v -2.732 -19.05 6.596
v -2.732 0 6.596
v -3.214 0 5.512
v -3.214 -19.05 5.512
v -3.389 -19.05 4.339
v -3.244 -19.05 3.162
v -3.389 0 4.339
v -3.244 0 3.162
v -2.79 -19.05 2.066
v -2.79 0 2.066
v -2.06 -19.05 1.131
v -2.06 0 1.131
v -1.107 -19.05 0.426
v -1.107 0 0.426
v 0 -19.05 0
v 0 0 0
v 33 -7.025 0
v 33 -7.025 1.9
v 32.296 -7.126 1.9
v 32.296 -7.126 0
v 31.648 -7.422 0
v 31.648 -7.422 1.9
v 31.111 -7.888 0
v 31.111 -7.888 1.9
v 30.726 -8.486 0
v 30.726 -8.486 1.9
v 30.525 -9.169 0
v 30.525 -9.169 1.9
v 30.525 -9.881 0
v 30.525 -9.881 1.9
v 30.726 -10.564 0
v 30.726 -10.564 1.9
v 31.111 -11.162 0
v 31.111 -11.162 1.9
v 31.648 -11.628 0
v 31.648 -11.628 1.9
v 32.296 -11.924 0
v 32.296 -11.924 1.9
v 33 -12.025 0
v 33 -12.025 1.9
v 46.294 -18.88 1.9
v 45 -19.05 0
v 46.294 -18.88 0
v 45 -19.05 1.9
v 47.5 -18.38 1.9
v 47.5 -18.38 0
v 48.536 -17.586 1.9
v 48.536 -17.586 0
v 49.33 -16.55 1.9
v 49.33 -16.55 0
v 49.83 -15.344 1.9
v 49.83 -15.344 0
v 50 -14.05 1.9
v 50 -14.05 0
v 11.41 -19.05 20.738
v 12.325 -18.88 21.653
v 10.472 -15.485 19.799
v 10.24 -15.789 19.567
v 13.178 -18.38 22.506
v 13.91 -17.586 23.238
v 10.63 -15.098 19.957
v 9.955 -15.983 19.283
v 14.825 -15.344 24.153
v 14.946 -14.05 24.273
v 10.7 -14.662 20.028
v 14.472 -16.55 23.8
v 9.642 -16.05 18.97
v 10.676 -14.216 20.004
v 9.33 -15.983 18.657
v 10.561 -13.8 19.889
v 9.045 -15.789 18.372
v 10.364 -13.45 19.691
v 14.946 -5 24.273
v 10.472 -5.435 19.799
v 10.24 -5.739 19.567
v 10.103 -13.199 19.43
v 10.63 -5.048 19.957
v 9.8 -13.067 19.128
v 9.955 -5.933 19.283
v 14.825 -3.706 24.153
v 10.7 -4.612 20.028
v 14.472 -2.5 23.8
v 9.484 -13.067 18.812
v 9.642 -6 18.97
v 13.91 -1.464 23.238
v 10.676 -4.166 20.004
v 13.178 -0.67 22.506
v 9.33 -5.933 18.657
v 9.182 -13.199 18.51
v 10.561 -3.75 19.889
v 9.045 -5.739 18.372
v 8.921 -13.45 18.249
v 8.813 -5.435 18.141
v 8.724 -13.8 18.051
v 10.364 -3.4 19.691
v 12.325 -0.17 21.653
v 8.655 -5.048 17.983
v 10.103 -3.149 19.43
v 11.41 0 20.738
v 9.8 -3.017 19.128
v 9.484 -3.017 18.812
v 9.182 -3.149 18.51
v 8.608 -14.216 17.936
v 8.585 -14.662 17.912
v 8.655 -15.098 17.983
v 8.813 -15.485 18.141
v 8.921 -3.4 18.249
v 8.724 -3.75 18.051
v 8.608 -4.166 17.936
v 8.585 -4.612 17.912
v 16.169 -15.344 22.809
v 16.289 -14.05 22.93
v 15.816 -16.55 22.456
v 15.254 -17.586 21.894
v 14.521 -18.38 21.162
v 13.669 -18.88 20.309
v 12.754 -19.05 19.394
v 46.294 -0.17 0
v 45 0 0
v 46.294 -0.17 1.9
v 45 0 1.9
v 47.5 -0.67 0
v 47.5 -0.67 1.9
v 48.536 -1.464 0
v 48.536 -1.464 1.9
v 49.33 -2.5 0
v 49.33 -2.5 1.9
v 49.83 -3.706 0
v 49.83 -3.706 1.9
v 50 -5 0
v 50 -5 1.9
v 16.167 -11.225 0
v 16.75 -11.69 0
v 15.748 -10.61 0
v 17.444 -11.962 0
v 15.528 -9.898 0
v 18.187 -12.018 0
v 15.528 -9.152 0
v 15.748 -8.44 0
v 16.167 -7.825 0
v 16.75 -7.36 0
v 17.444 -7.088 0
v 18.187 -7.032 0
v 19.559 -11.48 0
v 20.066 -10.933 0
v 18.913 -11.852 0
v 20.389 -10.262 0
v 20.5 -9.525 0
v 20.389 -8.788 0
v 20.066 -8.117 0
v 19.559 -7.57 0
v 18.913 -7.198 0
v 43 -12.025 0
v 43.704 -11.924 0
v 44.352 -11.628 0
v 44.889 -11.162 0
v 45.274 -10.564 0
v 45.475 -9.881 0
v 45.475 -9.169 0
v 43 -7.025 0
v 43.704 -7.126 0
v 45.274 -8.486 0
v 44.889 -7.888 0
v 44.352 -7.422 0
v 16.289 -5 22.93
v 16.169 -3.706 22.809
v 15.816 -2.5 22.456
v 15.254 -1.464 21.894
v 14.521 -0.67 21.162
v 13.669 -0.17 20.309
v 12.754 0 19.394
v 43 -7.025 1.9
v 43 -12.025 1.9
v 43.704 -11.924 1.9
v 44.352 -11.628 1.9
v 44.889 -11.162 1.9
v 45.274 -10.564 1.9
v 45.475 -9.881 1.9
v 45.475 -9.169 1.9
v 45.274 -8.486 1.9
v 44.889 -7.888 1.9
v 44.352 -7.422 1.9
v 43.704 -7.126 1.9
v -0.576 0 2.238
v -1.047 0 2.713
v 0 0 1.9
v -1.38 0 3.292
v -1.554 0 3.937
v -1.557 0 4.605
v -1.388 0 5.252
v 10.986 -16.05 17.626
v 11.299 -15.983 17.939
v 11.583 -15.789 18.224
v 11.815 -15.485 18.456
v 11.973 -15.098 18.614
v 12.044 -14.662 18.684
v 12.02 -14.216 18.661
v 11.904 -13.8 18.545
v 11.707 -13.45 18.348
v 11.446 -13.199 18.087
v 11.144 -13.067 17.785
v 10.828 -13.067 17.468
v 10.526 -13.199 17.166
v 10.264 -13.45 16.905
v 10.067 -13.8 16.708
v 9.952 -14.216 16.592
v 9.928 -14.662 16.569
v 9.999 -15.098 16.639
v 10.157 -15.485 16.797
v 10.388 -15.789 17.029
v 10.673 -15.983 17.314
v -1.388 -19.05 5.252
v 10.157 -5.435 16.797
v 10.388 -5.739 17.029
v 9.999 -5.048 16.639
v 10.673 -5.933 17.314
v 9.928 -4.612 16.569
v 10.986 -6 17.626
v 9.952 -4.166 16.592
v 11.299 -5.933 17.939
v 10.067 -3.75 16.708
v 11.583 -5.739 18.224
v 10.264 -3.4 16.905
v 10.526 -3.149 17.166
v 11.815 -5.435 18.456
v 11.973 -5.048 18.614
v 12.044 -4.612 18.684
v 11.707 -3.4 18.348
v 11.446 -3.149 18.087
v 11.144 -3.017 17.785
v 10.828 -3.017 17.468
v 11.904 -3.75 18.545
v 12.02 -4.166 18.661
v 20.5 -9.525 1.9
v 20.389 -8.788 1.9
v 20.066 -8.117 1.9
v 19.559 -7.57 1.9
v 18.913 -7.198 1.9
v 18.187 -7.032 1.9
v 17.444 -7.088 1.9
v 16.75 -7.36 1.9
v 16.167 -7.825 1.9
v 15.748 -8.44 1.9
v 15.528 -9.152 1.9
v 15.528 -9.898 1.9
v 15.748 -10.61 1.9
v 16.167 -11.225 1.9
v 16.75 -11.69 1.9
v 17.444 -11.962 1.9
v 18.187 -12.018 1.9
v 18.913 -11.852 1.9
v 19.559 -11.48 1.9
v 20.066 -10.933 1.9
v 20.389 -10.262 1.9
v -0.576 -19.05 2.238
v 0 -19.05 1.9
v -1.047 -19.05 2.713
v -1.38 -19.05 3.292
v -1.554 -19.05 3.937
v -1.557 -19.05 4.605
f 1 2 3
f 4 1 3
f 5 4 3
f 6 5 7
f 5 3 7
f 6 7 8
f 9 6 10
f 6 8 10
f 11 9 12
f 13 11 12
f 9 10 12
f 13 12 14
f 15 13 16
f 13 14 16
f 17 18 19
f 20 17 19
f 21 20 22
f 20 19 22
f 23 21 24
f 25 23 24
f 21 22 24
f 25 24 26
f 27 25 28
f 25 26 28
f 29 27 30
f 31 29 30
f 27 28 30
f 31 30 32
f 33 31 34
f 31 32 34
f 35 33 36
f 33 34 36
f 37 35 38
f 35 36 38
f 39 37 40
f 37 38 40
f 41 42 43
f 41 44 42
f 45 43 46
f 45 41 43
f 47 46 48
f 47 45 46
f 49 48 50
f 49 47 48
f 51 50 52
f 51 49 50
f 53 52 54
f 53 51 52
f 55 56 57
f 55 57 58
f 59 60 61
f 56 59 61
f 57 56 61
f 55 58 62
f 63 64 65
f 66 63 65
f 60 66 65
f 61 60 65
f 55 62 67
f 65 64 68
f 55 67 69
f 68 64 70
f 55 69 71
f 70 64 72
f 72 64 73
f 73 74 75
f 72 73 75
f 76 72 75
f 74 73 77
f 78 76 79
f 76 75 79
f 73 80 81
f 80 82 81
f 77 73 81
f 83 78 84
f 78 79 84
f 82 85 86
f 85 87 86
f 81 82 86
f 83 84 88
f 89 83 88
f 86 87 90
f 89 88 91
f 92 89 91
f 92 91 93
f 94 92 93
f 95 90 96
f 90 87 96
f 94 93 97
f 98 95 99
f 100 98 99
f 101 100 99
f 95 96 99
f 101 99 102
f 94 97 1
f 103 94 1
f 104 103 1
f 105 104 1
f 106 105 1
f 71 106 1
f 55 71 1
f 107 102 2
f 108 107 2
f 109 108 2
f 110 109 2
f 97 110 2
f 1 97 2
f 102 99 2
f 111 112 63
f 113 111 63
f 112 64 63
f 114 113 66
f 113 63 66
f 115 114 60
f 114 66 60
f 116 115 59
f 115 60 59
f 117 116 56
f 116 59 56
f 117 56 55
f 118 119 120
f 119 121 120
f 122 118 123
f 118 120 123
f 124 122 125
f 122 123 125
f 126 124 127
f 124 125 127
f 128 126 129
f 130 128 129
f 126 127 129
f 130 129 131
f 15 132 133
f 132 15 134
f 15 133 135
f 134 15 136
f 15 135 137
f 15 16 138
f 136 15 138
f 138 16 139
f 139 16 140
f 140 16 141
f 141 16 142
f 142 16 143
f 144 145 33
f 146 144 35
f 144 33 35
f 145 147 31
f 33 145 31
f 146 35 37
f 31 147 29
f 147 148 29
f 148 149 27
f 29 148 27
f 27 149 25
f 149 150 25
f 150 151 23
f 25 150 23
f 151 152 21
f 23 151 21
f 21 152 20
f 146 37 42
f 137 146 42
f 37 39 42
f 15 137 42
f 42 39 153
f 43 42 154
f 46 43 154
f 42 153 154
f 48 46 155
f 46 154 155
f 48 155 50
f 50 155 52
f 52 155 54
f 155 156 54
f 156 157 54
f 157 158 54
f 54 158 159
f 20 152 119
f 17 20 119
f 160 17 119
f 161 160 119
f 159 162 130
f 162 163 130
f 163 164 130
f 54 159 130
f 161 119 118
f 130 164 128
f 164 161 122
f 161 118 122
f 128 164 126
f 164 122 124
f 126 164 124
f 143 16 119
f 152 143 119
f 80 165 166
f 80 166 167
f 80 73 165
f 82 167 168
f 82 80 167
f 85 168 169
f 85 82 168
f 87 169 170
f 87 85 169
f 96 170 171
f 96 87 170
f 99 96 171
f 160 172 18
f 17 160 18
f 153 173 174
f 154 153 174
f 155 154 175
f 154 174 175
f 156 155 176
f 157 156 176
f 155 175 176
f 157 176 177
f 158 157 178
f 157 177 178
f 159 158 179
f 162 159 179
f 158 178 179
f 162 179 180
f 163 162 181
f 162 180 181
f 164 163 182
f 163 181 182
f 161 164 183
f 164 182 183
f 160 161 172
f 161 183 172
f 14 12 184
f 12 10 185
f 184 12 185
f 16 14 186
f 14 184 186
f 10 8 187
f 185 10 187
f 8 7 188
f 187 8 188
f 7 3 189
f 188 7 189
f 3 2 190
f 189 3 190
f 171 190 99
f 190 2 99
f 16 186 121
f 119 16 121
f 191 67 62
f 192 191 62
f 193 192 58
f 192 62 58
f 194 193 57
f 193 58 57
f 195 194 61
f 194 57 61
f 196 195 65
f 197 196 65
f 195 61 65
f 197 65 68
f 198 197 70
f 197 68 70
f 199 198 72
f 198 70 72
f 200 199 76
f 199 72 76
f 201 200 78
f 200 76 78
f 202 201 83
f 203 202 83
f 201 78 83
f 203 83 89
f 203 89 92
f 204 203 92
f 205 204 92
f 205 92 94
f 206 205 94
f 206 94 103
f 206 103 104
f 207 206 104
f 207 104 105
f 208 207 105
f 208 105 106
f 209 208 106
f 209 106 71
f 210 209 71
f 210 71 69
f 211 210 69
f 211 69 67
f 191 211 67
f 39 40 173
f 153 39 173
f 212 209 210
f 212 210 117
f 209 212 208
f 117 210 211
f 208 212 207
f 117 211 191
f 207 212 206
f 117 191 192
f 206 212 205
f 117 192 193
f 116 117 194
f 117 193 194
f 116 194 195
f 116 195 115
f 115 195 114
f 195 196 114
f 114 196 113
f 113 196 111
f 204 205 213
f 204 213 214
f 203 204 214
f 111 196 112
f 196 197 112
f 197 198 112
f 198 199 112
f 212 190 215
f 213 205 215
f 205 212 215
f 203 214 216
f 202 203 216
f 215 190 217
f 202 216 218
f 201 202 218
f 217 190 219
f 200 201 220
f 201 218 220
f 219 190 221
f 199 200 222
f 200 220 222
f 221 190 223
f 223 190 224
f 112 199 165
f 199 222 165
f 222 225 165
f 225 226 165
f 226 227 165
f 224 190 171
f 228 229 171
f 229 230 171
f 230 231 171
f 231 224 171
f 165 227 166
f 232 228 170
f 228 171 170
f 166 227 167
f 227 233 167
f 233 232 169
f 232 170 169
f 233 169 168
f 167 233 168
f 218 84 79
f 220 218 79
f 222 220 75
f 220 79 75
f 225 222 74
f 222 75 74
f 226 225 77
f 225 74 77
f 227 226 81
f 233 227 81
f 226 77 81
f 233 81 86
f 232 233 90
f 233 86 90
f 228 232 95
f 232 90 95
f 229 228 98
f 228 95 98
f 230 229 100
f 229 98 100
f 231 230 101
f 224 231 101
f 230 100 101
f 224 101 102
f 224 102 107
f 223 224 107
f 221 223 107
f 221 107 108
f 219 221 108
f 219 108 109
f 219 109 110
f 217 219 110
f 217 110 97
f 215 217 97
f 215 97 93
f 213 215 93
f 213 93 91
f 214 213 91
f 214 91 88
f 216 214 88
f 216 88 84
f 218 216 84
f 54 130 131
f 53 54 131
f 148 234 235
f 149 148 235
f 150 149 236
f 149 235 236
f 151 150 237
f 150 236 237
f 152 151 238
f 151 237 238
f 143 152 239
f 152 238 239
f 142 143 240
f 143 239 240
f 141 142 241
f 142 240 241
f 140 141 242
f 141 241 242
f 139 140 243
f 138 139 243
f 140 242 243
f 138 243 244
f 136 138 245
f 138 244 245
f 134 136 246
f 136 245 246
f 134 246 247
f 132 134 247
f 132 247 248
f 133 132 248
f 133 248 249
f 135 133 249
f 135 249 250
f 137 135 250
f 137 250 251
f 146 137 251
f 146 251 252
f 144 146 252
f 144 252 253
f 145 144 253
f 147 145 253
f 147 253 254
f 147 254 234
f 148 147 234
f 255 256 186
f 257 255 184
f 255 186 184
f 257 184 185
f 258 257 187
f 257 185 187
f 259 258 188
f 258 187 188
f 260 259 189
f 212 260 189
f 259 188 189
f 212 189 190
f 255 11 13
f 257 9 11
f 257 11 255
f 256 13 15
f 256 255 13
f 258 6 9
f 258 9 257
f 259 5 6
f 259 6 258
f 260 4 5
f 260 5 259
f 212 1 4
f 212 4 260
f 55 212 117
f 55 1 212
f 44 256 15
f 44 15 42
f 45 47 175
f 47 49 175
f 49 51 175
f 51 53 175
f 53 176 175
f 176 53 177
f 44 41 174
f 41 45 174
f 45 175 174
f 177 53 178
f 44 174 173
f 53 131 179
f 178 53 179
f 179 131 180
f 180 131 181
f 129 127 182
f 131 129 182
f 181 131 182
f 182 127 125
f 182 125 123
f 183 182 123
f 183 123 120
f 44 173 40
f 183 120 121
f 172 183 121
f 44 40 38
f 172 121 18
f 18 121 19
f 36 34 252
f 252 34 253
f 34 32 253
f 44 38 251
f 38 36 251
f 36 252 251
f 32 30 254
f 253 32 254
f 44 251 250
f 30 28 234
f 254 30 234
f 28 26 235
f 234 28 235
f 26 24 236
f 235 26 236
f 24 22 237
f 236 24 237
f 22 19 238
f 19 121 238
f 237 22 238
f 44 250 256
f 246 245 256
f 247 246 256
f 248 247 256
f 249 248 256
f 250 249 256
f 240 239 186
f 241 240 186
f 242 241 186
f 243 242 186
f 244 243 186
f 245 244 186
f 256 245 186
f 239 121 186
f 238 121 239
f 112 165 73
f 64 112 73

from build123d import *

# Parameters (mm, degrees)
F1_DEPTH  = 19.05
F2_R      = 5
F3_R      = 1.5
F4_DEPTH  = 10
F8_R      = 5
F9_R      = 2.5
F10_DEPTH = 25


with BuildPart() as f1:
    # F0 (on Front) → F1 (new body)
    with BuildSketch(Plane.XZ):
        with BuildLine():
            ThreePointArc((-2.7319921982, 6.5956126171), (-3.0542473294, 2.5985097523), (0, 0))
            Line((0, 0), (50, 0))
            Line((50, 0), (50, 1.9))
            Line((50, 1.9), (0, 1.9))
            ThreePointArc((0, 1.9), (-1.3800797918, 3.291972652), (-1.3884893139, 5.2521097328))
            Line((-1.3884893139, 5.2521097328), (16.2891802158, 22.9297792625))
            Line((16.2891802158, 22.9297792625), (14.9456773315, 24.2732821468))
            Line((14.9456773315, 24.2732821468), (-2.7319921982, 6.5956126171))
        make_face()
    extrude(amount=F1_DEPTH)

    # F2
    f2_edges = [f1.edges().sort_by_distance(p)[0] for p in [
        (15.617429, -19.05, 23.601531),
        (15.617429, 0, 23.601531),
    ]]
    fillet(f2_edges, radius=F2_R)

    # F3 (on face) → F4 (cut)
    with BuildSketch(Plane(origin=(-4.6638024076, 0, 4.6638024076), x_dir=(0, -1, 0), z_dir=(-0.7071067812, 0, 0.7071067812))):
        with Locations((14.55, 20.2319921982)):
            Circle(F3_R)
        with Locations((4.5, 20.2319921982)):
            Circle(F3_R)
    extrude(amount=-F4_DEPTH, mode=Mode.SUBTRACT)

    # F8
    f8_edges = [f1.edges().sort_by_distance(p)[0] for p in [
        (50, 0, 0.95),
        (50, -19.05, 0.95),
    ]]
    fillet(f8_edges, radius=F8_R)

    # F9 (on face) → F10 (cut)
    with BuildSketch(Plane.XY.offset(1.9)):
        with Locations((18, -9.525)):
            Circle(F9_R)
        with BuildLine():
            Line((33, -12.025), (43, -12.025))
            ThreePointArc((43, -12.025), (45.5, -9.525), (43, -7.025))
            Line((43, -7.025), (33, -7.025))
            ThreePointArc((33, -7.025), (30.5, -9.525), (33, -12.025))
        make_face()
    extrude(amount=-F10_DEPTH, mode=Mode.SUBTRACT)


solid = f1.part
